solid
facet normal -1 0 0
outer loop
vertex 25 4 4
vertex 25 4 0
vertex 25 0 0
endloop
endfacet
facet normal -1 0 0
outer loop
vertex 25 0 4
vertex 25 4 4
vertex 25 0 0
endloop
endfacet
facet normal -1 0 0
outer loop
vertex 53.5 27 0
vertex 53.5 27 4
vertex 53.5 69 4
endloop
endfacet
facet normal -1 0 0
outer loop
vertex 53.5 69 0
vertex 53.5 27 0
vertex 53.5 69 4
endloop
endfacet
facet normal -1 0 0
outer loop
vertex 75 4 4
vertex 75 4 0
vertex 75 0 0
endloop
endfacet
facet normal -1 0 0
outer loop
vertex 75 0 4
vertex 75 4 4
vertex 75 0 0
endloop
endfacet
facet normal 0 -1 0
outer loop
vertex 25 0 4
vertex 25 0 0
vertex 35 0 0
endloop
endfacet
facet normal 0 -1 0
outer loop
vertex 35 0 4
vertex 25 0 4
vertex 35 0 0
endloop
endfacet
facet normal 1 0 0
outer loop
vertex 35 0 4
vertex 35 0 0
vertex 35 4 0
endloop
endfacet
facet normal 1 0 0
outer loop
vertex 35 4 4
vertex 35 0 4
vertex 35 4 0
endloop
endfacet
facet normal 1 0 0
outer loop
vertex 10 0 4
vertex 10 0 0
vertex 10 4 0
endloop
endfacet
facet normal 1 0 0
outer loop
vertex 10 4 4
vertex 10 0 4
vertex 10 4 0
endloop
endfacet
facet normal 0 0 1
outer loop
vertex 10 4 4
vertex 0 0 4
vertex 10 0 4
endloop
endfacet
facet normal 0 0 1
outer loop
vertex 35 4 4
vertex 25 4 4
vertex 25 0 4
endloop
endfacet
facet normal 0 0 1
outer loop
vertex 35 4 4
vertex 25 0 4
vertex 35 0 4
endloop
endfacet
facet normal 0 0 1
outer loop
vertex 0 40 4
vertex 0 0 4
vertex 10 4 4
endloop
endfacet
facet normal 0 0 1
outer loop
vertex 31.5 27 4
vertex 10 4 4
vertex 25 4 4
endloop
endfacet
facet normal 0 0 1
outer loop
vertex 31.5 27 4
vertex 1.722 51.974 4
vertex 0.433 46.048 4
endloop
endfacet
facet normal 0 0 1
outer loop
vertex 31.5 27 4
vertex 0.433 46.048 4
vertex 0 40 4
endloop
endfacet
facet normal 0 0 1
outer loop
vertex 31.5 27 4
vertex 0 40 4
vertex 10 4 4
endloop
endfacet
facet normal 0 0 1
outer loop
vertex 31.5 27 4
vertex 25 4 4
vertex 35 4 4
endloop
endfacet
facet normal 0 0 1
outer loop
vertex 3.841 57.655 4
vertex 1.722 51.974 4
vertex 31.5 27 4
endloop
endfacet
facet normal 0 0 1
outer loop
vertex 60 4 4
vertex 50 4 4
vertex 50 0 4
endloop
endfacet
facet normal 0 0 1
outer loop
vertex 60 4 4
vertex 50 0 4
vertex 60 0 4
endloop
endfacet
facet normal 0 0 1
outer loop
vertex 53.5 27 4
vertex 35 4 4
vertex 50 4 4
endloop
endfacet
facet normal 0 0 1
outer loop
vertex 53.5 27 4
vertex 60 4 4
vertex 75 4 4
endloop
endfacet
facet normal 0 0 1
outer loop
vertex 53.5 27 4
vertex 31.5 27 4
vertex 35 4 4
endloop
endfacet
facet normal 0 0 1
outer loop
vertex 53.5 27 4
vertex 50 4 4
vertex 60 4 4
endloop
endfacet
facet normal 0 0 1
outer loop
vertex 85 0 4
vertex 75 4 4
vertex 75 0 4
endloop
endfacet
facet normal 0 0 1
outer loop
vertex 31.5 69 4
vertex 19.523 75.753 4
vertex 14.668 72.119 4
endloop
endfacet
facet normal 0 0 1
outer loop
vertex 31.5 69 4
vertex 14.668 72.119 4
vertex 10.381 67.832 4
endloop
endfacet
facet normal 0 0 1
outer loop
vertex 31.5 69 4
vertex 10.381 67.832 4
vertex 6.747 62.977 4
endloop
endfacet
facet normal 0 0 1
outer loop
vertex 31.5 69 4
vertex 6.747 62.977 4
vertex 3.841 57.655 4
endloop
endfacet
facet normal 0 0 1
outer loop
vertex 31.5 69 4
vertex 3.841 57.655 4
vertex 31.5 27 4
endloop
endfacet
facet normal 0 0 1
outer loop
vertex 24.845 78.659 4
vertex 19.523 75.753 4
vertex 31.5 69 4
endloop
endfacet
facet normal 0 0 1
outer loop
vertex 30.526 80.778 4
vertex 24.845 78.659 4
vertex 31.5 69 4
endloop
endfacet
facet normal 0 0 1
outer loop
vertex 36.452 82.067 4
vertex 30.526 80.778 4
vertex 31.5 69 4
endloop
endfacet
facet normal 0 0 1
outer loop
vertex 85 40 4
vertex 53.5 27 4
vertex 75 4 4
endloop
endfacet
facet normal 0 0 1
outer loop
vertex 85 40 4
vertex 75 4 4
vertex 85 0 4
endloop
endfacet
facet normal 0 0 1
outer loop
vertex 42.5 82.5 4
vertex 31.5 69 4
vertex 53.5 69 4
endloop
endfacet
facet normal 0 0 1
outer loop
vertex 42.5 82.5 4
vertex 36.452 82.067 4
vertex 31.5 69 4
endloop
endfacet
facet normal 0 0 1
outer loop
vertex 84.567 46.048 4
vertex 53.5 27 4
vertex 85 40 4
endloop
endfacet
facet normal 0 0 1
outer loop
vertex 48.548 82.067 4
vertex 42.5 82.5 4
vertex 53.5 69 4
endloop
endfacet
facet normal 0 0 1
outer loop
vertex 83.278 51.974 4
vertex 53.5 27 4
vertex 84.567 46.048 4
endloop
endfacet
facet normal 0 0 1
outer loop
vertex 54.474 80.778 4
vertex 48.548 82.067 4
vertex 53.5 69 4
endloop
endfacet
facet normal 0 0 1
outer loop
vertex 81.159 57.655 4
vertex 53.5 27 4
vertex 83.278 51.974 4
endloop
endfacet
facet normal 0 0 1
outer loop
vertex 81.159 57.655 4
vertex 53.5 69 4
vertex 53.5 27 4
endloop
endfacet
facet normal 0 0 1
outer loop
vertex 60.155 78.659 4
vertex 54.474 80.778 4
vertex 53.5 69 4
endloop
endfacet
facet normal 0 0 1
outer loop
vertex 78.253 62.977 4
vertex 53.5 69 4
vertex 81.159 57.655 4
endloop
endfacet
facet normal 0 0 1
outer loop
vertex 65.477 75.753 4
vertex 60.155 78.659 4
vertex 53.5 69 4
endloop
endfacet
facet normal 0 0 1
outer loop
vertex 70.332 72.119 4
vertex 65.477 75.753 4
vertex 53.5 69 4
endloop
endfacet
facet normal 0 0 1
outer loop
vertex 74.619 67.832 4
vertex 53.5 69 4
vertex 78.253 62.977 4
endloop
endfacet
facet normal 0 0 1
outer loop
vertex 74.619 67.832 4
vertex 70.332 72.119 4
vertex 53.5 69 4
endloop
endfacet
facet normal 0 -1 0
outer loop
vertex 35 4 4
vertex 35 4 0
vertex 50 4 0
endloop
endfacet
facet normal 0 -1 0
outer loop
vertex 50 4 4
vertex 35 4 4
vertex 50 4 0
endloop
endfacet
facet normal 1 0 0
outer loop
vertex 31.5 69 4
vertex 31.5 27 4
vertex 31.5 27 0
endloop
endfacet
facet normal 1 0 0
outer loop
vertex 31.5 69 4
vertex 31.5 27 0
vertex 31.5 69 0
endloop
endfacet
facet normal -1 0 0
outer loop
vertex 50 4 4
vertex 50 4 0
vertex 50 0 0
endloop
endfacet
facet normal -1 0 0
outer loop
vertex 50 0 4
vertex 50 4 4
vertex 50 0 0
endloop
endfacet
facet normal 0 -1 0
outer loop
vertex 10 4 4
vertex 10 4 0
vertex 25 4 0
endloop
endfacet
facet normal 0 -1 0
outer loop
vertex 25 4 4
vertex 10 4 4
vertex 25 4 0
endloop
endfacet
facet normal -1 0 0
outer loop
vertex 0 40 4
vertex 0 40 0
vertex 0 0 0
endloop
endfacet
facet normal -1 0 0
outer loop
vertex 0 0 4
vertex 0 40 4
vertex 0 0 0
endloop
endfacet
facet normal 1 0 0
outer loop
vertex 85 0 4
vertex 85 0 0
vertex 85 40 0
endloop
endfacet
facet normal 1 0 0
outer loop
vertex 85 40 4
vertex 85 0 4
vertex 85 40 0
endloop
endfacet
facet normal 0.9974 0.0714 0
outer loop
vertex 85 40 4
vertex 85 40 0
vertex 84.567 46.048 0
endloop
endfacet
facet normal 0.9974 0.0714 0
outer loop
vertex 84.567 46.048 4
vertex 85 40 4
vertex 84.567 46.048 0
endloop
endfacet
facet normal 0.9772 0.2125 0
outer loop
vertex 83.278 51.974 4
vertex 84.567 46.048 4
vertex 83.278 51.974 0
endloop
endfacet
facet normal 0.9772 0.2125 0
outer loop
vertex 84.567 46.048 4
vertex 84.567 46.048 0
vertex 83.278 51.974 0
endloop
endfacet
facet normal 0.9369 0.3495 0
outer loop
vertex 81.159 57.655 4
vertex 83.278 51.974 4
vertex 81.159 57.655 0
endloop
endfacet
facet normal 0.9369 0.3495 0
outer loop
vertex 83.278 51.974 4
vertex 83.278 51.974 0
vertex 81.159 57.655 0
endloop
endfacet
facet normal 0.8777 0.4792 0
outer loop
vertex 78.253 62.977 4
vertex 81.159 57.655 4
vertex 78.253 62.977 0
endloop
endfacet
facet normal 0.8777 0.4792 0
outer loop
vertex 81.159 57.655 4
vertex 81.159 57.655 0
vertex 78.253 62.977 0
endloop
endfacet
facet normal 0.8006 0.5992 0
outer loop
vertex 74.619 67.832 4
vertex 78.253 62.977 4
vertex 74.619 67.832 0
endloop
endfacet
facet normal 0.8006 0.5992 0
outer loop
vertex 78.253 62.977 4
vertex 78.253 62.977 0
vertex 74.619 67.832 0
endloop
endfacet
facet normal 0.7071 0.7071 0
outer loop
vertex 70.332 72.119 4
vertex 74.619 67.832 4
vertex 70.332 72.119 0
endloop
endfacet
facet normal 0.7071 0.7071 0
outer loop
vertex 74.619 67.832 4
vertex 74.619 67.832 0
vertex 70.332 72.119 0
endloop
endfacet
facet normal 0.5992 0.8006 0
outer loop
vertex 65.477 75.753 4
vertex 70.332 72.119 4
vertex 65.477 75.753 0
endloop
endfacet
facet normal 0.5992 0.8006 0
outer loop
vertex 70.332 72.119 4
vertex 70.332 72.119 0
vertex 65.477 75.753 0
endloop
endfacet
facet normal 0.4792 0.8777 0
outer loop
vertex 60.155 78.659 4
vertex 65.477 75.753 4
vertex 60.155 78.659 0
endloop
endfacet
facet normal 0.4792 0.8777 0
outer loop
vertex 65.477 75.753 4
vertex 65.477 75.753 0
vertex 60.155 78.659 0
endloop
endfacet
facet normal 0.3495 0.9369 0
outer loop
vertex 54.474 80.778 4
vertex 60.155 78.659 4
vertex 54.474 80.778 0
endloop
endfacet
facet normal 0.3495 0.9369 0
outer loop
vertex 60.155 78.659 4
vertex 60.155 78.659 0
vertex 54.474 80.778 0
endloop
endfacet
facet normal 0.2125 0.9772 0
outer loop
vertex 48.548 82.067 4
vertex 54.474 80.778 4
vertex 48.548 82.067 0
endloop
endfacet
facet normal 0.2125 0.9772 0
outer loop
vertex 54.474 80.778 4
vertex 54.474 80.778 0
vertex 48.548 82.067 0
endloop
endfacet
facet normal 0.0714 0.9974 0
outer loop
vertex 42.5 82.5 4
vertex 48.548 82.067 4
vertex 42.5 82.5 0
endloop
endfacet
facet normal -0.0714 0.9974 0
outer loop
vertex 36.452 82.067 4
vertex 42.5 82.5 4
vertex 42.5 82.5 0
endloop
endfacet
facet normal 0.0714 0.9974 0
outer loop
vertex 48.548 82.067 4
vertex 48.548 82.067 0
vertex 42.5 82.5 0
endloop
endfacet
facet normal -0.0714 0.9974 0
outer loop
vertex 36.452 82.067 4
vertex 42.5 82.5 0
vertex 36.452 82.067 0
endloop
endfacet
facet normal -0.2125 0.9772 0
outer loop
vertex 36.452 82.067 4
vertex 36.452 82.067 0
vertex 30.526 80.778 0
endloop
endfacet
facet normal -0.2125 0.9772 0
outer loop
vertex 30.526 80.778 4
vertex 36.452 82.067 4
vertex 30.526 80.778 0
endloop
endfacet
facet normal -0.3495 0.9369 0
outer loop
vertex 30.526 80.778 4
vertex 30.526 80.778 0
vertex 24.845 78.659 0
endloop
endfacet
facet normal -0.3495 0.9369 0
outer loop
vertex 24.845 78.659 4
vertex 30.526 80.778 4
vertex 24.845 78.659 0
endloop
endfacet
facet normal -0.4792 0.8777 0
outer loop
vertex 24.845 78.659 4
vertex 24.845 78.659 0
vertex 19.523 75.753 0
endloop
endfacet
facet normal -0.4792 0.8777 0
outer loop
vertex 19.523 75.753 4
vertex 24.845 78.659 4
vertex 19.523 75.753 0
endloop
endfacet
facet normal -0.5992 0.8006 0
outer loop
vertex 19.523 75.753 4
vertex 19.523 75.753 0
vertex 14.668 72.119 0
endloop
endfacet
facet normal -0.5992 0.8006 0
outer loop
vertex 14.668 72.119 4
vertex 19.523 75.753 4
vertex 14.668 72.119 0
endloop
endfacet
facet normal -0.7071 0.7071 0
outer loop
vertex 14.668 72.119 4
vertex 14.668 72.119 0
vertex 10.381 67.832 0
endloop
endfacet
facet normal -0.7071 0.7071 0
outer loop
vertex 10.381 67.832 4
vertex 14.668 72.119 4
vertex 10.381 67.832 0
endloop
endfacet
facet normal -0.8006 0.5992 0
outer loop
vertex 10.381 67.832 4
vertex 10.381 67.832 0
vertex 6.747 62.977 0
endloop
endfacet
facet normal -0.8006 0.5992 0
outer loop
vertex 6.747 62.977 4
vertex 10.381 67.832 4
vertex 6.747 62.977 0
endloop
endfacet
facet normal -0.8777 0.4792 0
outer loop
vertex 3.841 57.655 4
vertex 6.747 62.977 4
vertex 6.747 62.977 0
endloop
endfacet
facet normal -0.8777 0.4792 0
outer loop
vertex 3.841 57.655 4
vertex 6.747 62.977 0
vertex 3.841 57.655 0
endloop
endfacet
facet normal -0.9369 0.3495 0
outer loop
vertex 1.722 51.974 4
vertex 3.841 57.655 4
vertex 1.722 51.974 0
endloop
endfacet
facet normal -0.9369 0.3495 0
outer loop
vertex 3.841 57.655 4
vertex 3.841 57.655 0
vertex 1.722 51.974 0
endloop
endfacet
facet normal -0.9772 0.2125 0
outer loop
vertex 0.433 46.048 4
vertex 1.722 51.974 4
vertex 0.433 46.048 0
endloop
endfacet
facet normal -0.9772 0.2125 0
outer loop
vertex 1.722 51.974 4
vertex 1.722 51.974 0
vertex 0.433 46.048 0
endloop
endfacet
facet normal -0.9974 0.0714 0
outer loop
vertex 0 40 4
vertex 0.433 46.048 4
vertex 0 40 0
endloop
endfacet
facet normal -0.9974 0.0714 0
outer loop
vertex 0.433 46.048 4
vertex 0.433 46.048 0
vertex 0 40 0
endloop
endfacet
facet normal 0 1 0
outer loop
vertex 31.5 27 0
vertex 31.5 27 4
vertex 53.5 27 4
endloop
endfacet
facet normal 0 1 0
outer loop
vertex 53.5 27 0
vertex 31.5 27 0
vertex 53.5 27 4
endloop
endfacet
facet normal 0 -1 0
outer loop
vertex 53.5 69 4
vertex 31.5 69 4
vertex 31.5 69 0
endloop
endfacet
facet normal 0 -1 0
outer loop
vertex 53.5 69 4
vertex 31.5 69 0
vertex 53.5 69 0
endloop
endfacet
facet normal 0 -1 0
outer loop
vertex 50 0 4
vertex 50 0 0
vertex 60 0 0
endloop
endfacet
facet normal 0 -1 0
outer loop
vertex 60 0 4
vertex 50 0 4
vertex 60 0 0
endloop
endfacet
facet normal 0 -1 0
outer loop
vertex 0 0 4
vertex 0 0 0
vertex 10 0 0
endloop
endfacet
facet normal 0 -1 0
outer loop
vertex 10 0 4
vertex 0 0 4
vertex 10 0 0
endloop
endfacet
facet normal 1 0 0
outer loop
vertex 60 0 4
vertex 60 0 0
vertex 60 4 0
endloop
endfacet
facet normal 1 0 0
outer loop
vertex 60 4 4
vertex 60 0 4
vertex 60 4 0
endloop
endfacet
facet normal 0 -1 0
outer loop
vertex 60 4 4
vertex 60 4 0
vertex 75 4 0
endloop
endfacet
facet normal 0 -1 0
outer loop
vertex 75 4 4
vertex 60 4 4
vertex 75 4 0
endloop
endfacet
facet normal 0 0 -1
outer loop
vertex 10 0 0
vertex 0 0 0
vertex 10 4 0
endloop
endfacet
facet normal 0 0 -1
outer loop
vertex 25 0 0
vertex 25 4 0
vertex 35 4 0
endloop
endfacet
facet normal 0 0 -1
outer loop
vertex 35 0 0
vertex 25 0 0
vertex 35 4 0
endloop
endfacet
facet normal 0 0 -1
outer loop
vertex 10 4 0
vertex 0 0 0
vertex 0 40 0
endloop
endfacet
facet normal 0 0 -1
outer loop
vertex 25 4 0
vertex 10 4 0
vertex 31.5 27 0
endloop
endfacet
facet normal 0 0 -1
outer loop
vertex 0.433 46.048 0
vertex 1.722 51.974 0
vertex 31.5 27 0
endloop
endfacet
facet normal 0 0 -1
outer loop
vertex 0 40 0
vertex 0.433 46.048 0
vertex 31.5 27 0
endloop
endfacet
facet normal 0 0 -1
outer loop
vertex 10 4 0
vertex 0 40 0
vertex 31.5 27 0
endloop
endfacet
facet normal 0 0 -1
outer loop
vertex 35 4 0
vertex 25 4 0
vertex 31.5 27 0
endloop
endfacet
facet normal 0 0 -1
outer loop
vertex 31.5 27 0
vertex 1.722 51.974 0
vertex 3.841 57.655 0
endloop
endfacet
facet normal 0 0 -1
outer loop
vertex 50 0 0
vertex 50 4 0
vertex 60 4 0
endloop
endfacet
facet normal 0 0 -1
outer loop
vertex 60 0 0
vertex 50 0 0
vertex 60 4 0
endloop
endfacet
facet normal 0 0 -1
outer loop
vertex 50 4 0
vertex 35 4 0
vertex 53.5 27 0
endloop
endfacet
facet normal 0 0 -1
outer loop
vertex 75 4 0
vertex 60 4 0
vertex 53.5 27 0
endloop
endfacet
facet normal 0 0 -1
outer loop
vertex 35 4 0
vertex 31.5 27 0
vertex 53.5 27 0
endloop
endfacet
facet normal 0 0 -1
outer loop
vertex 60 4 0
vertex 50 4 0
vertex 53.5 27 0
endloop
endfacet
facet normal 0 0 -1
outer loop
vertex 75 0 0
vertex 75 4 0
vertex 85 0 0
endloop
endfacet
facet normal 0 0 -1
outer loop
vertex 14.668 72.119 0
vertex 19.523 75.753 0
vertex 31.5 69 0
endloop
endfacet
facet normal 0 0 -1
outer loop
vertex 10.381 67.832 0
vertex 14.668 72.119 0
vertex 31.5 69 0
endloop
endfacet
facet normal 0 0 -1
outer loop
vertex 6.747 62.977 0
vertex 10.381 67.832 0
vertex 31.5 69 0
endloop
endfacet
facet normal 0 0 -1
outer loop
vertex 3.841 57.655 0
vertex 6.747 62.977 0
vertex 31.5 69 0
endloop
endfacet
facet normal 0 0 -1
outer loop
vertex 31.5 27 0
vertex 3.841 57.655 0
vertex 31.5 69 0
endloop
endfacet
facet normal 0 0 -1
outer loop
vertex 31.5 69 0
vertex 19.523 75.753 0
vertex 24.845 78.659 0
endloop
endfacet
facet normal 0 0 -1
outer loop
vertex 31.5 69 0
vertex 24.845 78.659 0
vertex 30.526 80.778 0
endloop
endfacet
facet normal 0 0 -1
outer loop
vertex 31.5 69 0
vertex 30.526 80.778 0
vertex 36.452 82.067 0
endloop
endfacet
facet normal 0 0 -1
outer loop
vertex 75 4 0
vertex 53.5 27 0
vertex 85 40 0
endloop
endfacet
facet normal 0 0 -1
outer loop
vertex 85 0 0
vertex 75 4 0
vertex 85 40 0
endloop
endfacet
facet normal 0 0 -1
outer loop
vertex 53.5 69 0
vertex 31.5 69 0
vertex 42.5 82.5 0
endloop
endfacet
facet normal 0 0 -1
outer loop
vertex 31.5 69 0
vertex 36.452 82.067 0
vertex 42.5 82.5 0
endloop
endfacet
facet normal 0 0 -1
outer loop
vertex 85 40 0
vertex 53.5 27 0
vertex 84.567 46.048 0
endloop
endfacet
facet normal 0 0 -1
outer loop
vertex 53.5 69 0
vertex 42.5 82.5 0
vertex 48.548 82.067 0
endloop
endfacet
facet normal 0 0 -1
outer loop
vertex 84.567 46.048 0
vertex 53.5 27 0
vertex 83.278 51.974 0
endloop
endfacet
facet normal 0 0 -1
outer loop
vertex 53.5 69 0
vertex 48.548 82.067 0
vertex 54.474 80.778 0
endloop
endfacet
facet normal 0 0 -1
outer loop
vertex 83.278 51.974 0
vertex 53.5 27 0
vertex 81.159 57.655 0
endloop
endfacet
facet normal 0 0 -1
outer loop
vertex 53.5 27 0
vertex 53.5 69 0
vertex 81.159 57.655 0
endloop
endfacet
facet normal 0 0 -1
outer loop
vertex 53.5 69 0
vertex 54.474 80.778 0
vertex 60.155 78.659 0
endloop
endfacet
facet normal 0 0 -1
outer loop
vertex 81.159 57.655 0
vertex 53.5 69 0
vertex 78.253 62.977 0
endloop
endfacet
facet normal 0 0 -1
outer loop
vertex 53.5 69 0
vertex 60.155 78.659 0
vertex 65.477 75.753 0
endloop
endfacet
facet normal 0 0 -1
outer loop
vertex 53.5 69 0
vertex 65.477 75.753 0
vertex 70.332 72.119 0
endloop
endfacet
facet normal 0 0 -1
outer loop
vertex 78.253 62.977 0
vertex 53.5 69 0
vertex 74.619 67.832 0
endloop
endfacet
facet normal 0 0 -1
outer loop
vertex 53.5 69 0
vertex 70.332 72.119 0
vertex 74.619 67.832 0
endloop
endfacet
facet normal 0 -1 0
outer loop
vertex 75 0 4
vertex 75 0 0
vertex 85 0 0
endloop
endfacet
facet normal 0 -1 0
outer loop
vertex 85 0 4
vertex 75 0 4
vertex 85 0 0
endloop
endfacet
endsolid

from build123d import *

# Parameters (mm, degrees)
SALIENTE_EXTRUIR1_DEPTH = 4
CROQUIS2_W              = 22
CROQUIS2_H              = 42
CORTAR_EXTRUIR1_DEPTH   = 4


with BuildPart() as part:
    # Croquis1 → Saliente-Extruir1 (new body)
    with BuildSketch(Plane.XY):
        with BuildLine():
            Line((0, 0), (10, 0))
            Line((10, 0), (10, 4))
            Line((10, 4), (25, 4))
            Line((25, 4), (25, 0))
            Line((25, 0), (35, 0))
            Line((35, 0), (35, 4))
            Line((35, 4), (50, 4))
            Line((50, 4), (50, 0))
            Line((50, 0), (60, 0))
            Line((60, 0), (60, 4))
            Line((60, 4), (75, 4))
            Line((75, 4), (75, 0))
            Line((75, 0), (85, 0))
            Line((85, 0), (85, 40))
            ThreePointArc((85, 40), (42.5, 82.5), (0, 40))
            Line((0, 40), (0, 0))
        make_face()
    extrude(amount=SALIENTE_EXTRUIR1_DEPTH)

    # Croquis2 → Cortar-Extruir1 (cut)
    with BuildSketch(Plane.XY.offset(4)):
        with Locations((42.5, 48)):
            Rectangle(CROQUIS2_W, CROQUIS2_H)
    extrude(amount=-CORTAR_EXTRUIR1_DEPTH, mode=Mode.SUBTRACT)


solid = part.part
